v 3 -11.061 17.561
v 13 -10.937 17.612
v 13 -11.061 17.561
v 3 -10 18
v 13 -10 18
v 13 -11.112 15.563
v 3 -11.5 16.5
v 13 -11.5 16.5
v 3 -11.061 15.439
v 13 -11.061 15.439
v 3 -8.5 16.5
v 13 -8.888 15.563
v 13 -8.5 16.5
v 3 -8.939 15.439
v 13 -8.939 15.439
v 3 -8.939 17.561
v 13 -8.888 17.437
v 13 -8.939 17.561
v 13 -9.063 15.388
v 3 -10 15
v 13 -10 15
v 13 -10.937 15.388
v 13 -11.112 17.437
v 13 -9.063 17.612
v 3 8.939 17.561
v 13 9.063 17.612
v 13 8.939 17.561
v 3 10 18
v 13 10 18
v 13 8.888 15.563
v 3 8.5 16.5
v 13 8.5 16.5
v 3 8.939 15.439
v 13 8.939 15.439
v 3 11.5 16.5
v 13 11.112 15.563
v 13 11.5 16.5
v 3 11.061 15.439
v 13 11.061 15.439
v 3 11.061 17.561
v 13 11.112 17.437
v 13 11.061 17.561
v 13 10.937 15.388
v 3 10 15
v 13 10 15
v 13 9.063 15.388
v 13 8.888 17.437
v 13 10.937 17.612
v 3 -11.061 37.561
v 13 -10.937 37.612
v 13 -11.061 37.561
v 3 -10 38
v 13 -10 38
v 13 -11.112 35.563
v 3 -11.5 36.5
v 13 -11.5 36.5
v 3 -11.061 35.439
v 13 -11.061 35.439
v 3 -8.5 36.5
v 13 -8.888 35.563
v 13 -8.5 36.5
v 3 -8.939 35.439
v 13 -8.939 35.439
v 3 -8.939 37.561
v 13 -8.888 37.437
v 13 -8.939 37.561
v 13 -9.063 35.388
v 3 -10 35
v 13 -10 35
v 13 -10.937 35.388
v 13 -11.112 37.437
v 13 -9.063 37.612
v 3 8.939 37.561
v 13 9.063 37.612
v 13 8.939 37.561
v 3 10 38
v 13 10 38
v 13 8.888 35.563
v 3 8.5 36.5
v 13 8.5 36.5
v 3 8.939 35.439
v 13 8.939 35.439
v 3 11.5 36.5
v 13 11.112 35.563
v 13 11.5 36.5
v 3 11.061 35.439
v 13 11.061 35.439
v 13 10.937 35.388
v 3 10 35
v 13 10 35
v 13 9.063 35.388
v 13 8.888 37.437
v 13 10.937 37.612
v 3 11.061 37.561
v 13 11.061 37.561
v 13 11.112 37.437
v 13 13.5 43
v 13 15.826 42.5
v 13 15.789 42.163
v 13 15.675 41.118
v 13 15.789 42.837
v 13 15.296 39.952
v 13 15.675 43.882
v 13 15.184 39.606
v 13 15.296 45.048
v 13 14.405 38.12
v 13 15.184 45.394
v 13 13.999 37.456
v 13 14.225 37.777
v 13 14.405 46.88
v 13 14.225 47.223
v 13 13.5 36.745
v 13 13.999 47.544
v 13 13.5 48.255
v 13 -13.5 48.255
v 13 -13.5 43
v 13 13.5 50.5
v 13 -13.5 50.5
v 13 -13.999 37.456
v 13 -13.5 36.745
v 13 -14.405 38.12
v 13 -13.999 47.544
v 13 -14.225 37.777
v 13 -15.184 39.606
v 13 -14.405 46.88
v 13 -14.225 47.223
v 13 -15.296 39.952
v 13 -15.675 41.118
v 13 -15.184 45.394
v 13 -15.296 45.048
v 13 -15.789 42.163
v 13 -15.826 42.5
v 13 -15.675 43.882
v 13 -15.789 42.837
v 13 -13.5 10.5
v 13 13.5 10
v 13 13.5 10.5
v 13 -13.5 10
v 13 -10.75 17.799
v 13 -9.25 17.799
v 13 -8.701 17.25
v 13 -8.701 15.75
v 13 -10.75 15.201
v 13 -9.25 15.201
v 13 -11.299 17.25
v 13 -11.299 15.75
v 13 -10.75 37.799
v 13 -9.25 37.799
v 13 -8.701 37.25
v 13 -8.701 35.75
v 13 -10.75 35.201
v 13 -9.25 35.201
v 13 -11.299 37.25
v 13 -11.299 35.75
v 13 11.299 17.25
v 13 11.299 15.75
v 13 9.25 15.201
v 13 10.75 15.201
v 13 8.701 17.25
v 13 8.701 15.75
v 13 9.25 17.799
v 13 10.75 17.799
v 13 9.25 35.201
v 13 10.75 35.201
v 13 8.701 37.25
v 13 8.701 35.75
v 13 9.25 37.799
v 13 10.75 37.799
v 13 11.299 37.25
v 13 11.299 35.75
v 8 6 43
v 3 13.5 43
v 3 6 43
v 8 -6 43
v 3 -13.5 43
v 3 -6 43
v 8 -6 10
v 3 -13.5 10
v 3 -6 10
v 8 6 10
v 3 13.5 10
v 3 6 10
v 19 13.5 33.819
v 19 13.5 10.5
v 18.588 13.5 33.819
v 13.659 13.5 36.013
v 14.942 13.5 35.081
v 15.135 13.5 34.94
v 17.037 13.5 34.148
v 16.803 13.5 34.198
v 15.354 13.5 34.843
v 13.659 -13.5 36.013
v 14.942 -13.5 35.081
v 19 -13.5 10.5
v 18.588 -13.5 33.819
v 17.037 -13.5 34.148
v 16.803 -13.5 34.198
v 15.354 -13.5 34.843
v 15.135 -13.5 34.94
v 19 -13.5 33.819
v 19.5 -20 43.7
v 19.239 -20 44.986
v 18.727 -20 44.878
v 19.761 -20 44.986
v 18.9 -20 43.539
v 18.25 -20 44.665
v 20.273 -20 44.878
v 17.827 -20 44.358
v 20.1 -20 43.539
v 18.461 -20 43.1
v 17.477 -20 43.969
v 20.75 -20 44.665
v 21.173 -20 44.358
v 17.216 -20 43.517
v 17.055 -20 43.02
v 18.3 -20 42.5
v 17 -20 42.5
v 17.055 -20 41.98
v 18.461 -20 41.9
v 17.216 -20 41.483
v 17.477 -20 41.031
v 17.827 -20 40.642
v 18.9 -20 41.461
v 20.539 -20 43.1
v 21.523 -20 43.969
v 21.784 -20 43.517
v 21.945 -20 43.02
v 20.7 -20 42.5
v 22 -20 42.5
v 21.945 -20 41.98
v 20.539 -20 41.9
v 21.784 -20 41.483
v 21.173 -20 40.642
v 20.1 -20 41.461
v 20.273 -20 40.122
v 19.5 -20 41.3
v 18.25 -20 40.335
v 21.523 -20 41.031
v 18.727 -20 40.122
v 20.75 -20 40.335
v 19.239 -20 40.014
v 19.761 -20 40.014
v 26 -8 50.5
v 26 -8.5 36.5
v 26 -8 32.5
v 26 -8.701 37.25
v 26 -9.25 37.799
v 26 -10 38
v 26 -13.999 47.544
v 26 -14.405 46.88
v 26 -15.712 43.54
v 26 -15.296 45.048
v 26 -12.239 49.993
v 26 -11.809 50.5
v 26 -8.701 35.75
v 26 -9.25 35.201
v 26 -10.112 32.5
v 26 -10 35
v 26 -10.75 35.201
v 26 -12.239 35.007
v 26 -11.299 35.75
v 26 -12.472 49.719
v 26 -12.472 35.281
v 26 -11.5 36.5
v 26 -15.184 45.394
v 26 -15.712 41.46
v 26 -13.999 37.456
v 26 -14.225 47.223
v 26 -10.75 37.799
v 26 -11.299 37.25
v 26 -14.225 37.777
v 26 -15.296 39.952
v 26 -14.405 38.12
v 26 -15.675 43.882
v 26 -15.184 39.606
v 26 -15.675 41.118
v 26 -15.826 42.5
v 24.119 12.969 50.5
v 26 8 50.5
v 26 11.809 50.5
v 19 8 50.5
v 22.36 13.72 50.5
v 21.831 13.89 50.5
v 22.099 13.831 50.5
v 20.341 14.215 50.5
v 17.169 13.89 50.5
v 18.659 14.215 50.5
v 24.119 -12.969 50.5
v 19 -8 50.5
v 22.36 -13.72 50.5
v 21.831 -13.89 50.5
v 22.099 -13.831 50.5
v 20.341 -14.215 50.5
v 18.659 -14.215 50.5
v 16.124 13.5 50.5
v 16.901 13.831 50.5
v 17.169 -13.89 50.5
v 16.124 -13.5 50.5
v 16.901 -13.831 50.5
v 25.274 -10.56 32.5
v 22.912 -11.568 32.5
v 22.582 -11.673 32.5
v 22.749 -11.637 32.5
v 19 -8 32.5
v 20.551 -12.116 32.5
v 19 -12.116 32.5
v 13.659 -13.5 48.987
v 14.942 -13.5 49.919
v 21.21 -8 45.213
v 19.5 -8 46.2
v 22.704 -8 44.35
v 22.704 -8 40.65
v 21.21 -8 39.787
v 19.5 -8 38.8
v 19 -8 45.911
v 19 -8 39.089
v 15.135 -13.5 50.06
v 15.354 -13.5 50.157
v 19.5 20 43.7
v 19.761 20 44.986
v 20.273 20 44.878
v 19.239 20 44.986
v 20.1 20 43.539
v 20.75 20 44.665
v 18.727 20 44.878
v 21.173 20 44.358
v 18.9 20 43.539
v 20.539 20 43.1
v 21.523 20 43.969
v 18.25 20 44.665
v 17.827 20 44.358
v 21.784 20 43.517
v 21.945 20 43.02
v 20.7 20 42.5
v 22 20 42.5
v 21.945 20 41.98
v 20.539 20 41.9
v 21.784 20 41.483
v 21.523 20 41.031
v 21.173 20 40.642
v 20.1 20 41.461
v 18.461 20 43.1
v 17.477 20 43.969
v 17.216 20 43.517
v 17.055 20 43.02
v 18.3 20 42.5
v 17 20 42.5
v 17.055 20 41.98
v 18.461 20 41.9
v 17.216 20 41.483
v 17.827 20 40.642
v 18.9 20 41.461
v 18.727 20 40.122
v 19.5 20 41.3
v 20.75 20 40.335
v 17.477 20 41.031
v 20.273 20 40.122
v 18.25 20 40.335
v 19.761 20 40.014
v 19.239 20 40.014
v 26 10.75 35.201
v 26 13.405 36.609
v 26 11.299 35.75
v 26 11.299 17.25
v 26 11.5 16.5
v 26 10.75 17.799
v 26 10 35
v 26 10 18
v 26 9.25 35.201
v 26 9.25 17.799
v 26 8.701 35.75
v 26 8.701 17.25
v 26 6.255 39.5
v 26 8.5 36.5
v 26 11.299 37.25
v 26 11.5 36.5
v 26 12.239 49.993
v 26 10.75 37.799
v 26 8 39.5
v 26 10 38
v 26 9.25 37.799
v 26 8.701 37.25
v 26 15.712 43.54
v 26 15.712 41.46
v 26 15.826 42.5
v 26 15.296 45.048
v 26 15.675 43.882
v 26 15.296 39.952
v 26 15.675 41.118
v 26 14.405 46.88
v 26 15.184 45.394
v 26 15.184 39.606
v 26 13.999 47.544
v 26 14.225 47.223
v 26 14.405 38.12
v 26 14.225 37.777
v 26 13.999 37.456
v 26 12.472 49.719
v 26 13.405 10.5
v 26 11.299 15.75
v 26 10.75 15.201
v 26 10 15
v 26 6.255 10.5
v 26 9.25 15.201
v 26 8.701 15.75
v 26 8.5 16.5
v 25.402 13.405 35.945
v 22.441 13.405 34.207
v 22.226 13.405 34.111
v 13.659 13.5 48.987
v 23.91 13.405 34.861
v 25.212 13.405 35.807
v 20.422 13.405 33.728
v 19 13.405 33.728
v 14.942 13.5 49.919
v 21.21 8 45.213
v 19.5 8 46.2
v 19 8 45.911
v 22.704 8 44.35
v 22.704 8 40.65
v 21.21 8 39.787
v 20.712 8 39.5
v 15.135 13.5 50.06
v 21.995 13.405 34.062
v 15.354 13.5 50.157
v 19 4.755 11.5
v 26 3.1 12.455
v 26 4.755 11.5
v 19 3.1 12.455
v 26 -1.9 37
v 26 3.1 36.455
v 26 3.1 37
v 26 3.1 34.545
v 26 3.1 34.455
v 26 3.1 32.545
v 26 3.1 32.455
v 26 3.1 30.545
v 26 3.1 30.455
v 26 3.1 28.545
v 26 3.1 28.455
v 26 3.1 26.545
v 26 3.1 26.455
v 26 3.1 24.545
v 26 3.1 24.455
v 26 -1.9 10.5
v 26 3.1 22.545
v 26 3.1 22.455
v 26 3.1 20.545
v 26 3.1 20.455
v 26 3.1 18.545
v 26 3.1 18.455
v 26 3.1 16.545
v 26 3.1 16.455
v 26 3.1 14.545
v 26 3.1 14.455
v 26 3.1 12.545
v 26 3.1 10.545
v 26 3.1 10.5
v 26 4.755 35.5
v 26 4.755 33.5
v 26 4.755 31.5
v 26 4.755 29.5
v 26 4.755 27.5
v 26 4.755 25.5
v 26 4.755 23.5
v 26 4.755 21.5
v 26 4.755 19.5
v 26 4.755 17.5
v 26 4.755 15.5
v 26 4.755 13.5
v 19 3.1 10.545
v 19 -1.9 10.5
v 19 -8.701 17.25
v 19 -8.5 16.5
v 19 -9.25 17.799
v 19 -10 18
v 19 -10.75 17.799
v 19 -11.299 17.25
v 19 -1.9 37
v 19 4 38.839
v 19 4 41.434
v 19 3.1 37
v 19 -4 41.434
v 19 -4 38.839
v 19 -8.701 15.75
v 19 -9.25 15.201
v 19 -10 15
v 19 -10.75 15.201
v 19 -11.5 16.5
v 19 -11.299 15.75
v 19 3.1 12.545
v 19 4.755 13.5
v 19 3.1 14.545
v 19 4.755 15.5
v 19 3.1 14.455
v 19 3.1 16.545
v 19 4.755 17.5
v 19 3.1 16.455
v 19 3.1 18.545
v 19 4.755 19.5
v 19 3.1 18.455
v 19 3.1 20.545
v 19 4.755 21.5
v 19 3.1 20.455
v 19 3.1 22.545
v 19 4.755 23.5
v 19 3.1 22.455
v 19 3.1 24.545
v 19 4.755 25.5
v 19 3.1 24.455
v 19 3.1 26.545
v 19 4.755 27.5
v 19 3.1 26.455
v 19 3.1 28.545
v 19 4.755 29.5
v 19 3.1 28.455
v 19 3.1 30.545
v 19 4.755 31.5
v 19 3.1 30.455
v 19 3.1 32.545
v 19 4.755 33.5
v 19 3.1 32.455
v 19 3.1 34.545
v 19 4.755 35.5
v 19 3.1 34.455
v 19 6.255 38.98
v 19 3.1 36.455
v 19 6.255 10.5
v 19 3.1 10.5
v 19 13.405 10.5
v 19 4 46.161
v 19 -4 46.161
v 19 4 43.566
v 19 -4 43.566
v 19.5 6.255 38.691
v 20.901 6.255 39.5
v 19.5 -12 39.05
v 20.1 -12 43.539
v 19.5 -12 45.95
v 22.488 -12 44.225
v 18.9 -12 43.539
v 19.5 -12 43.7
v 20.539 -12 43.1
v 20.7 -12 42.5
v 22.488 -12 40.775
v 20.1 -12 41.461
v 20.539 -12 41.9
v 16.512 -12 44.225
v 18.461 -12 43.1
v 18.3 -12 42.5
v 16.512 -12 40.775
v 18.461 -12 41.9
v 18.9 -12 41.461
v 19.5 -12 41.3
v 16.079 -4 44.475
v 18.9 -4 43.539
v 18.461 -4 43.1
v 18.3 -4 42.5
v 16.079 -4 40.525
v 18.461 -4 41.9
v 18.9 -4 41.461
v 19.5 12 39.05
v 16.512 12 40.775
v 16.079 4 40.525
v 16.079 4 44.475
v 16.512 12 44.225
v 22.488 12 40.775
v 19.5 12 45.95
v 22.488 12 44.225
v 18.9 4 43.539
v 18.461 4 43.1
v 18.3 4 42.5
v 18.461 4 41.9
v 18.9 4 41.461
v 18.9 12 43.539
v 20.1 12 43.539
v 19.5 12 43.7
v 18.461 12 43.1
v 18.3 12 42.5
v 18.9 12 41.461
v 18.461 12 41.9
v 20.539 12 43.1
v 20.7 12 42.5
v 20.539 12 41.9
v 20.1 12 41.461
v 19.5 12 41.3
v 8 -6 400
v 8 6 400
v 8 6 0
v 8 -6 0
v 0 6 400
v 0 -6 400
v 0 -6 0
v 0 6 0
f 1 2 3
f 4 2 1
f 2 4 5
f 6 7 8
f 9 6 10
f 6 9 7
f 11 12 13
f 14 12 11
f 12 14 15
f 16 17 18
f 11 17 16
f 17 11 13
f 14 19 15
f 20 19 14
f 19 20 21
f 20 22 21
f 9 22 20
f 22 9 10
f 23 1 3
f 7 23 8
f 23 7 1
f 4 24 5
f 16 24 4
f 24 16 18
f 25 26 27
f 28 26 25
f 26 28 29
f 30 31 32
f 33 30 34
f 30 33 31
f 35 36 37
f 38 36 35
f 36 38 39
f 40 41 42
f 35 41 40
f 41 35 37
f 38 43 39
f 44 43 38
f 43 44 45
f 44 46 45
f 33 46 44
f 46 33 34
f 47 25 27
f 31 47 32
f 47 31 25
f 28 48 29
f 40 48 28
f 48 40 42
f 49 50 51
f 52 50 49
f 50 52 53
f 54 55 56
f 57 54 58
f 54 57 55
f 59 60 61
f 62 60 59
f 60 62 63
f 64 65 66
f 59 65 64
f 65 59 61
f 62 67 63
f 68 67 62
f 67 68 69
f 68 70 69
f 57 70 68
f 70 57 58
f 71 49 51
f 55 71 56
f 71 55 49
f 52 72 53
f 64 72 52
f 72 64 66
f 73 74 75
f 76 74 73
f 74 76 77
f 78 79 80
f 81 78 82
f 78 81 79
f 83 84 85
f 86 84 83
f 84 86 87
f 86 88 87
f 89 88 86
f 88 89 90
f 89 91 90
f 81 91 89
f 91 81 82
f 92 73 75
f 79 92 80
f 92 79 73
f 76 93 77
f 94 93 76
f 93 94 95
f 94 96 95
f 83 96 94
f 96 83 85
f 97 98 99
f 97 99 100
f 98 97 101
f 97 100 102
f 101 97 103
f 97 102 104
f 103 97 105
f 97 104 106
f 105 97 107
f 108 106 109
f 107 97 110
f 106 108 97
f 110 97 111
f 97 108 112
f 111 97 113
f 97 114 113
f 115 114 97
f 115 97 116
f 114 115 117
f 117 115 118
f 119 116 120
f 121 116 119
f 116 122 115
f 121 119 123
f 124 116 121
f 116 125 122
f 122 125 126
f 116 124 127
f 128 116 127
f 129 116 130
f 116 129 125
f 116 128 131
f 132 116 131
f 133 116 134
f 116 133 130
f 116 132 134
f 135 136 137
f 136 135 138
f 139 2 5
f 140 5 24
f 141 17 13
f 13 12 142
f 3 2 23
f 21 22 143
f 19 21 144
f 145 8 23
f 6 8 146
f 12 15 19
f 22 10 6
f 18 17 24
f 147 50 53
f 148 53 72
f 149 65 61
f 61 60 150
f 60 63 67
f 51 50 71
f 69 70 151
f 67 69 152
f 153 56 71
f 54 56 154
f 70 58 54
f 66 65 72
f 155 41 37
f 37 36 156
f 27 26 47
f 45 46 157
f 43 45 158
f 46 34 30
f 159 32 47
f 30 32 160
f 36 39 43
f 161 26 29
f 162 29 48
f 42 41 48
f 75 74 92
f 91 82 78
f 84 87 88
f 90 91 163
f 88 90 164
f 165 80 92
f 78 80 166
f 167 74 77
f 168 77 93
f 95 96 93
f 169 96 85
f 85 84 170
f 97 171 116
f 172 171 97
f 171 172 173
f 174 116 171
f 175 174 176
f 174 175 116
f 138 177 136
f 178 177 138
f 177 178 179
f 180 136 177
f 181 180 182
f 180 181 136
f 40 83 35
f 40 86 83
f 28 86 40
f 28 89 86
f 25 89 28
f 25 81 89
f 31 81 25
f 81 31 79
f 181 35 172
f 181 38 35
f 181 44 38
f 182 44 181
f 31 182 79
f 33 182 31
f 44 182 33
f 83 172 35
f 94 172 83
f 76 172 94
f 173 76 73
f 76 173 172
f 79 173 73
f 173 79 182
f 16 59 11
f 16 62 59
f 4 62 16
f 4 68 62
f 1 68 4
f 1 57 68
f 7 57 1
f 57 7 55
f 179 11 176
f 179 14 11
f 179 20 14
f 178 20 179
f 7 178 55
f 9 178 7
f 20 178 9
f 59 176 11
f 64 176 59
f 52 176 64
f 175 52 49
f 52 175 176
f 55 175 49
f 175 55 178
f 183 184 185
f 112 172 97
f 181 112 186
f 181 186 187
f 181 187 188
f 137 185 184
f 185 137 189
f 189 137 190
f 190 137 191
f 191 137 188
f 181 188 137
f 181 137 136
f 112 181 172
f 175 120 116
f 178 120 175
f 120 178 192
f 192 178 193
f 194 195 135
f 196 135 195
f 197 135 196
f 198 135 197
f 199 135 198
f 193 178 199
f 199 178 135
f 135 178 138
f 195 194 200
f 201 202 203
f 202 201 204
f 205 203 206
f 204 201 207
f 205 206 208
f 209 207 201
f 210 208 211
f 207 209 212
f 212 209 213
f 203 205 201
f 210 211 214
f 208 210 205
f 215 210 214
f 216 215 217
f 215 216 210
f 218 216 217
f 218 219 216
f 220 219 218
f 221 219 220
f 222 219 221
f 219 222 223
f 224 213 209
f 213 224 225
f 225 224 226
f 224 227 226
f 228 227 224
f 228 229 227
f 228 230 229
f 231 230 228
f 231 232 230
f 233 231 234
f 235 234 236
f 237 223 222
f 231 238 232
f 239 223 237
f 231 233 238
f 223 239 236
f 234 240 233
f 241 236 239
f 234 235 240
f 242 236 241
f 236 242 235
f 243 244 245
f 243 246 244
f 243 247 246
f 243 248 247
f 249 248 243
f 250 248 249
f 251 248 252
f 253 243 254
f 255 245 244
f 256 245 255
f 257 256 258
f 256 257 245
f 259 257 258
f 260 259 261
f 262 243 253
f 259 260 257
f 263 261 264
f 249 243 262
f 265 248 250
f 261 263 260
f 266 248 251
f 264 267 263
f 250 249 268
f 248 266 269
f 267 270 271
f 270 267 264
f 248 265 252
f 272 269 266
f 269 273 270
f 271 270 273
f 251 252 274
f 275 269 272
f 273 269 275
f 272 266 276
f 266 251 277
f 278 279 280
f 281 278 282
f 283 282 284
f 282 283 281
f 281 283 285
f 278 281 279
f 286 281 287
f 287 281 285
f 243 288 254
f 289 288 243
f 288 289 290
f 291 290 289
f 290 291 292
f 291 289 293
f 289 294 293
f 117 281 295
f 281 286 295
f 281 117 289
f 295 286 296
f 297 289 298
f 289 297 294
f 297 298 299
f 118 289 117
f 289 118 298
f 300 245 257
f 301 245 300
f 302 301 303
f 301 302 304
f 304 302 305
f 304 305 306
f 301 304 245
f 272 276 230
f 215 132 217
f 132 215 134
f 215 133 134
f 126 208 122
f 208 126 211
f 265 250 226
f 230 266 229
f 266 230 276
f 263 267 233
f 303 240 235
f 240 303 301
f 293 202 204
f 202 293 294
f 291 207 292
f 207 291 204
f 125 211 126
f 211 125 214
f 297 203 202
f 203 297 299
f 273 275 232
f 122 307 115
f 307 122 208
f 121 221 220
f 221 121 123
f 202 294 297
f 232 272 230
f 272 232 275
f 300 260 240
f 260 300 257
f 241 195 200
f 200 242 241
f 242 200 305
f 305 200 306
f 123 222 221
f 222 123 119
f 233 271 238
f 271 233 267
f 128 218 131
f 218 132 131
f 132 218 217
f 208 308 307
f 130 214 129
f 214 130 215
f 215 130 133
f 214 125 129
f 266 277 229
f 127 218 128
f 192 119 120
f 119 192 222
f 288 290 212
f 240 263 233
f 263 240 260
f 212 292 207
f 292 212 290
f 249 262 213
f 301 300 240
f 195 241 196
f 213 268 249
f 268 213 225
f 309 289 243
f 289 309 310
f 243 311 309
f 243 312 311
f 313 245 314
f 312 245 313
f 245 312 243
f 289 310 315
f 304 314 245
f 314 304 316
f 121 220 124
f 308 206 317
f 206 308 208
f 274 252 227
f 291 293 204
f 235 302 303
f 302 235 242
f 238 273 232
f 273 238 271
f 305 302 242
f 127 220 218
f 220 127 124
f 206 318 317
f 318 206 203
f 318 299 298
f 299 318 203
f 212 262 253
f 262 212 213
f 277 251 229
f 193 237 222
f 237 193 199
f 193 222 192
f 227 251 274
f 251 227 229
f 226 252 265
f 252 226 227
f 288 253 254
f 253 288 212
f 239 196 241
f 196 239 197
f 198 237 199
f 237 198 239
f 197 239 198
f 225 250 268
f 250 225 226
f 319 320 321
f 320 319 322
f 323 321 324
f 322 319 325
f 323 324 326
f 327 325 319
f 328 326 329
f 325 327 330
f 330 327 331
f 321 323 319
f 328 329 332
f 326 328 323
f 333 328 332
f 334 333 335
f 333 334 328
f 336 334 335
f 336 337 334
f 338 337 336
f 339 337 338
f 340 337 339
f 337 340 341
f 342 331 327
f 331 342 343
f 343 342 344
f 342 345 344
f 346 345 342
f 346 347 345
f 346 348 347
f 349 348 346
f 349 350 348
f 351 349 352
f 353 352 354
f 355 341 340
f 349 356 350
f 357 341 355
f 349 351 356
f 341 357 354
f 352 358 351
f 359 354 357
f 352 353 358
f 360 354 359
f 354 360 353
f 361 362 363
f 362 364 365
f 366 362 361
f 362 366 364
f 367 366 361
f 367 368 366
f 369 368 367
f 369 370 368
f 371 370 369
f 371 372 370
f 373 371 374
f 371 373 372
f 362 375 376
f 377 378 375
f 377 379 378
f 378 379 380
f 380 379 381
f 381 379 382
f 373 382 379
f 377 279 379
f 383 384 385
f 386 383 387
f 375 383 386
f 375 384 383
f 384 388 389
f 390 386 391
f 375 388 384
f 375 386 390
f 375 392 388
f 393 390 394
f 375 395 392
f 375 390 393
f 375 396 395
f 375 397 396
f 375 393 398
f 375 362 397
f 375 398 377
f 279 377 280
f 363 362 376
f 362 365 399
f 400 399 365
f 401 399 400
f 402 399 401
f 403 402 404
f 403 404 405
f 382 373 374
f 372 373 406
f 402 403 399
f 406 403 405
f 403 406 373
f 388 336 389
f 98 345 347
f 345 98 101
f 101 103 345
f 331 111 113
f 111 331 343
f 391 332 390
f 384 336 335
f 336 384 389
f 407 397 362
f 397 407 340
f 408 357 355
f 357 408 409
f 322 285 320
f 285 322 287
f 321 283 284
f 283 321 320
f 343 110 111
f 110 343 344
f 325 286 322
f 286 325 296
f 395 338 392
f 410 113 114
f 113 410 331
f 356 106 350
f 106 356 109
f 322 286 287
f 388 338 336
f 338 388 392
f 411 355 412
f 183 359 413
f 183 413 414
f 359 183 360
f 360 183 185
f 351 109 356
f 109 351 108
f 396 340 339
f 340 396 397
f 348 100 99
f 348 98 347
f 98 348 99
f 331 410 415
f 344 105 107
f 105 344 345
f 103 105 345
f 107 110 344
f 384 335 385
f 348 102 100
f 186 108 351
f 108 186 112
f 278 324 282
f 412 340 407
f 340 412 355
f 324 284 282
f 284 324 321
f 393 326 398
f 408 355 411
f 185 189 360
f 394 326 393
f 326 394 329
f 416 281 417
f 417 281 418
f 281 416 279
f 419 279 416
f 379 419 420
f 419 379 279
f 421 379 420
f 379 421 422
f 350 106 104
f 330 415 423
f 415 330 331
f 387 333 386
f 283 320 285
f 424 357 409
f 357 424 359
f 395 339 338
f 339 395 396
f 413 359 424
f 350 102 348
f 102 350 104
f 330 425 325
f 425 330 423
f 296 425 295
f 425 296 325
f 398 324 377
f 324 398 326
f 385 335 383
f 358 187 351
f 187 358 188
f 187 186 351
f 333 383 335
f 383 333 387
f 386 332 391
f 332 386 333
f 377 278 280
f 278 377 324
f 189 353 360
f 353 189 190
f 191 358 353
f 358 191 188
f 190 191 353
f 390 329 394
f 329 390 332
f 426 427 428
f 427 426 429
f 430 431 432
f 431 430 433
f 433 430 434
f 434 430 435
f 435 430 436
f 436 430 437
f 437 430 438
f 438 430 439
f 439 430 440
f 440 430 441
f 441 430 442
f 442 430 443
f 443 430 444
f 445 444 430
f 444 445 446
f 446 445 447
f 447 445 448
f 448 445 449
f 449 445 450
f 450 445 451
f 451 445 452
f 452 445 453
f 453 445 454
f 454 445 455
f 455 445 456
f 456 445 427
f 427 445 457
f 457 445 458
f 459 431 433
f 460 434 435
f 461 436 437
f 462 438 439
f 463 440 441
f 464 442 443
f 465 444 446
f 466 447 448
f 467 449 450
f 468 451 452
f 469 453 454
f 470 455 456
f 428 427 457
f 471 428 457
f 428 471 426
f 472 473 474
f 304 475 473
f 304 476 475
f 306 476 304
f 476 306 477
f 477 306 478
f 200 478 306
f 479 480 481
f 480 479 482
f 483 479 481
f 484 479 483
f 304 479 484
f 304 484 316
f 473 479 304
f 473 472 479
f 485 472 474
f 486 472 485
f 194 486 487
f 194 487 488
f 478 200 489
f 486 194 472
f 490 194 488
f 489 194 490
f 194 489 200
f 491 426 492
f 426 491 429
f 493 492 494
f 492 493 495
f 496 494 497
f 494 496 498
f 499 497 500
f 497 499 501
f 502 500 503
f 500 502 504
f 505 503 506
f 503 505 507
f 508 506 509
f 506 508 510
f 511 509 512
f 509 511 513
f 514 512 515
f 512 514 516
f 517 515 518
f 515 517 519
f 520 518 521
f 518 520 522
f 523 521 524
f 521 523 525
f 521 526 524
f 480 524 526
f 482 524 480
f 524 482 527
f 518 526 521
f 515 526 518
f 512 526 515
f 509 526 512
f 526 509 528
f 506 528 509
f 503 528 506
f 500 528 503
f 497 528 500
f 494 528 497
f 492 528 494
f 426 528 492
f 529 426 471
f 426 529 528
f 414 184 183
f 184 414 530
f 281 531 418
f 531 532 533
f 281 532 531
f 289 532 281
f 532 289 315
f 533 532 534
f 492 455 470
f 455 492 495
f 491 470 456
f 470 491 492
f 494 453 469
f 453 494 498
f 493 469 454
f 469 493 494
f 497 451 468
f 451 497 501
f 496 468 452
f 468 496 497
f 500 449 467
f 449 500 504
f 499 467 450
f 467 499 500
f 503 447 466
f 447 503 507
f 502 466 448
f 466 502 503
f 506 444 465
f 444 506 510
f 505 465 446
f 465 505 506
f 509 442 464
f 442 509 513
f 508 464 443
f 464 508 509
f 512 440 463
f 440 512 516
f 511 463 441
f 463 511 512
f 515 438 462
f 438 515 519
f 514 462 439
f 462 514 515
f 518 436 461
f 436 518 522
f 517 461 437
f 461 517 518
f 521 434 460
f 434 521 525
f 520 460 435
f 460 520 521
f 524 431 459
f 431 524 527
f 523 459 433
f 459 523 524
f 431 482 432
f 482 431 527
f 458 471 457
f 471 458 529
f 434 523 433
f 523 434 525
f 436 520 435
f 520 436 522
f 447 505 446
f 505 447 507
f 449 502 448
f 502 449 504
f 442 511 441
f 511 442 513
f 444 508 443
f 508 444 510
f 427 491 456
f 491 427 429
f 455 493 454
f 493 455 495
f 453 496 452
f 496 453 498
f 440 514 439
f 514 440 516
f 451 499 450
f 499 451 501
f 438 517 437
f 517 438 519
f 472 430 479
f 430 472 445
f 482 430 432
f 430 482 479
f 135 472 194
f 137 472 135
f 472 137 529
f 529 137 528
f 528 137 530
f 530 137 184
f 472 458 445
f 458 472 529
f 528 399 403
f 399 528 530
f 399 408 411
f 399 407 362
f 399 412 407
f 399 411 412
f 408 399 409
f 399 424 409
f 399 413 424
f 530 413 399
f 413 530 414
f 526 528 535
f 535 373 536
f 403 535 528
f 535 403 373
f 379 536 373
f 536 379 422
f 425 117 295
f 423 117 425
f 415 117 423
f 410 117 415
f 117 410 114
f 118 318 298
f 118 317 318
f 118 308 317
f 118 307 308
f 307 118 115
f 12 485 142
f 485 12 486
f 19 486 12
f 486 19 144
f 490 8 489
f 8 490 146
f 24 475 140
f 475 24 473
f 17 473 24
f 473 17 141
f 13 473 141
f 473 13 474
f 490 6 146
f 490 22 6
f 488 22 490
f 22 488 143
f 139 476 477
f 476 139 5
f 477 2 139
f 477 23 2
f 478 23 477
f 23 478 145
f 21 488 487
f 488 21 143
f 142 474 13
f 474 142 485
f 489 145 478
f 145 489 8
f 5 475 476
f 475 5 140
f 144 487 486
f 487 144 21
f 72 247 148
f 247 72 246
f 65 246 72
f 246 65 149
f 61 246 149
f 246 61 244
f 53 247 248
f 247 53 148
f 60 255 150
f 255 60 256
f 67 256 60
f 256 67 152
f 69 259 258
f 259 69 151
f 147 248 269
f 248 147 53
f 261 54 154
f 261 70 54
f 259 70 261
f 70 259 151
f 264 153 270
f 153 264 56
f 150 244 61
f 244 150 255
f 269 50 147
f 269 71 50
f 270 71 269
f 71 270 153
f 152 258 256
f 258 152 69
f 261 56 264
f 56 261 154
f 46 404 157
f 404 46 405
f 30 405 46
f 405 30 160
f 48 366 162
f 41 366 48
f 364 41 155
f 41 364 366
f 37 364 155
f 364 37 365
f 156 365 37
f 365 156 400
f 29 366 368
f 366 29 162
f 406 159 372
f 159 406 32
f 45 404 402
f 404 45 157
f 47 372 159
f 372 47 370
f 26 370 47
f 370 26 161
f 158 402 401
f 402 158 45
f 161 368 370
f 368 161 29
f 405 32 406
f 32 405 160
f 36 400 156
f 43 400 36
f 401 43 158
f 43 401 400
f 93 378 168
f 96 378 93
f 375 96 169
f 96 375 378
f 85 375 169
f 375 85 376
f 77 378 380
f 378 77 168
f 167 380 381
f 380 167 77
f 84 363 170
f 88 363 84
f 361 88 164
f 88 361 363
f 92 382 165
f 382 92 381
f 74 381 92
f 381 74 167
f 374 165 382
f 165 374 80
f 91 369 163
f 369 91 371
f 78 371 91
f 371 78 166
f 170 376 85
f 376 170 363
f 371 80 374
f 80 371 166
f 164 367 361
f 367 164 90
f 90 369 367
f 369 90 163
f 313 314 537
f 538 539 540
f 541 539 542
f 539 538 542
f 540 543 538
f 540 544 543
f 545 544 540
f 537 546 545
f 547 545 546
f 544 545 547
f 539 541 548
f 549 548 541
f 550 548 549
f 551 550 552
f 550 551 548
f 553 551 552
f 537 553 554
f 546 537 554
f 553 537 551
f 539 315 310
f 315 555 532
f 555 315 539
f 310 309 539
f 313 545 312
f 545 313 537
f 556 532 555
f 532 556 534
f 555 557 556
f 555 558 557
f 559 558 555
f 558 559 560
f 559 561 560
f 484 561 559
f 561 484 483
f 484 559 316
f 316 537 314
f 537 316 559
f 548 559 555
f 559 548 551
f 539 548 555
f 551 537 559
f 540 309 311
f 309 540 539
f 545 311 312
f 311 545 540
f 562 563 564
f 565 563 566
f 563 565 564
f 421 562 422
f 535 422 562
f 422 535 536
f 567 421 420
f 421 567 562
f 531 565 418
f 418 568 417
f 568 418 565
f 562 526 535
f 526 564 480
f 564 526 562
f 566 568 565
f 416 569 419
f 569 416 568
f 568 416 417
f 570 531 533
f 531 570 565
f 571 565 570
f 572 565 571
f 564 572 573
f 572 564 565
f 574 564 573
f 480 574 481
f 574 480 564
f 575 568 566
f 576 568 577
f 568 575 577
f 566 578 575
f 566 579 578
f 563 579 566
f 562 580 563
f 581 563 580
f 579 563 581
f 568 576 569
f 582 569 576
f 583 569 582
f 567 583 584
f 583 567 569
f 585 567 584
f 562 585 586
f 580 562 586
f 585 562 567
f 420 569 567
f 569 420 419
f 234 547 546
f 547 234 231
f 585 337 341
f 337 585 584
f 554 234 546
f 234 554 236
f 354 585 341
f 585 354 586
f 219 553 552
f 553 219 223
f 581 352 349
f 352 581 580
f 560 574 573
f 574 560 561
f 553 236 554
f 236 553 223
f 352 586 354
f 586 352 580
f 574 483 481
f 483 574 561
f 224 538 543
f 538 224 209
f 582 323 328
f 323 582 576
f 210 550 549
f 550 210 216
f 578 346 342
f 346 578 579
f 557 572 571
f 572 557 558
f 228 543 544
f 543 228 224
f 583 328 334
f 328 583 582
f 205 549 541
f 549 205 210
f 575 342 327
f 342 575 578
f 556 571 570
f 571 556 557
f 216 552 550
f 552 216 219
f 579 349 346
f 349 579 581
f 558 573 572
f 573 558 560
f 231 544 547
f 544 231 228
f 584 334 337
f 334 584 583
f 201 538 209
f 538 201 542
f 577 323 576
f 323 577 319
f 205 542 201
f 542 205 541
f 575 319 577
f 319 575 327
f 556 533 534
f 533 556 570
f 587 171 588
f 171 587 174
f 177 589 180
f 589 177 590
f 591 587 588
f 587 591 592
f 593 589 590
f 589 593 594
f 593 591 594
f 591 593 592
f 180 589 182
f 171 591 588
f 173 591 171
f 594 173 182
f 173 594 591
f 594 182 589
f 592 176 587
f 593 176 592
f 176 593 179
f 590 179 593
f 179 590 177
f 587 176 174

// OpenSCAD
// file: configuration.scad
// Increase this if your slicer or printer make holes too tight.
extra_radius = 0.20;

// OD = outside diameter, corner to corner.
m3_nut_od = 6.1;
m3_nut_radius = m3_nut_od/2 + 0.2 + extra_radius;

// Major diameter of metric 3mm thread.
m3_major = 2.85;
m3_radius = m3_major/2 + extra_radius;
m3_wide_radius = m3_major/2 + extra_radius + 0.2;

// NEMA17 stepper motors.
motor_shaft_diameter = 5;
motor_shaft_radius = motor_shaft_diameter/2 + extra_radius;

// Frame brackets. M3x8mm screws work best with 3.6 mm brackets.
thickness = 3.6;

// OpenBeam or Misumi. Currently only 15x15 mm, but there is a plan
// to make models more parametric and allow 20x20 mm in the future.
//extrusion = 15;
extrusion = 20;
//extrusion_block_width = 2.5; //15x15
extrusion_block_width = 6.1; //20x20

//corner_radius = 36; //15x15
corner_radius = 40; //20x20

//extrusion_offset = 0;//15x15
extrusion_offset = -2.5; //20x20

//height_offset = 0; //15x15
height_offset = -extrusion_offset; //20x20

//screw_offset=-7.5; //15x15
screw_offset=-12; //20x20
// file: carriage.scad
include <configuration.scad>;

separation = 40;
thickness = 6;

horn_thickness = 13;
horn_x = 8;

belt_width = 5;
belt_x = 5.6;
belt_z = 7;
belt_gas = 1/cos(30)+0.7+0.2+extra_radius;

module carriage() {
  // Timing belt (up and down).
  translate([-belt_x, 0, belt_z + belt_width/2]) %
    cube([1.7, 100, belt_width], center=true);
  translate([belt_x, 0, belt_z + belt_width/2]) %
    cube([1.7, 100, belt_width], center=true);
  difference() {
    union() {
      // Main body.
      translate([0, 4, thickness/2])
        cube([27, 40, thickness], center=true);
      // Ball joint mount horns.
      for (x = [-1, 1]) {
        scale([x, 1, 1]) intersection() {
          translate([0, 15, horn_thickness/2])
            cube([separation, 18, horn_thickness], center=true);
          translate([horn_x, 16, horn_thickness/2]) rotate([0, 90, 0])
            cylinder(r1=14, r2=2.5, h=separation/2-horn_x);
        }
      }//for
      // Belt clamps.
      difference() {
        union() {
      //   translate([6.5, -2.5, horn_thickness/2+1])
      //      cube([14, 7, horn_thickness-2], center=true);
      //   translate([10.75, 2.5, horn_thickness/2+1])
      //      cube([5.5, 16, horn_thickness-2], center=true);
        }
        // Avoid touching diagonal push rods (carbon tube).
      //  translate([20, -10, 12.5]) rotate([35, 35, 30])
      //    cube([40, 40, 20], center=true);
      }
//卡带槽
	union()
	{
		translate([5-1-0.4, -15, thickness])gt2(w=7,l=25);
//		translate([5-1, -15+16, thickness])gt2(w=7,l=10);
		translate([-2-1+0.9+0.2,-16,thickness])cube([5,26.5,7]);
//		translate([-2.5-1,-16+16,thickness])cube([7,12,7]);
//		translate([5-3, -15+11.5, thickness])rotate([0,0,90])gt2(w=7,l=5);
//		translate([-2, -15+14.5, thickness])rotate([0,0,-90])gt2(w=7,l=5);
		translate([5-1+belt_gas,-16,thickness])cube([7+0.15,26+3,7]);
	}
 /*     for (y = [-12, 7]) {
    #    translate([1.25, y, thickness+4])
          cube([7, 8, 8], center=true);
      } */
    }//union
    // Screws for linear slider.
    for (x = [-10, 10]) {
      for (y = [-10, 10]) {
        translate([x, y, thickness]) 
          cylinder(r=1.5, h=30, center=true, $fn=12);
      }
    }
    // Screws for ball joints.
    translate([0, 16, horn_thickness/2]) rotate([0, 90, 0]) 
      cylinder(r=1.2, h=60, center=true, $fn=12);
    // Lock nuts for ball joints.
    for (x = [-1, 1]) {
      scale([x, 1, 1]) intersection() {
        translate([horn_x, 16, horn_thickness/2]) rotate([90, 0, -90])
          cylinder(r1=m3_nut_radius, r2=m3_nut_radius+0.5, h=8,
                   center=true, $fn=6);
      }
    }
  }
}
//GT2齿面
module gt2(l,w)
{
	//cube([1,l,w]);
	for(n=[0:2:l])
	{
		translate([0,n,0])cylinder(r=1/cos(30),h=w,$fn=3);
	}
}

module test_gt2(s)
{
	union()
	{
		gt2(w=6,l=20);
		translate([-4.5,0,-3])cube([11,20,3]);
		translate([1/cos(30)+s+0.2+extra_radius,0,0])cube([4,20,6]);
		translate([-4.5,0,0])cube([4,20,6]);
	}
}

//translate([0,0,10])test_gt2(s=0.7);
carriage();
// main file
use <carriage.scad>

module rod(z=0)
{
	translate([0,-6,0])
	{
		cube([8,12,400]);
		block(z);
	}
}

module block(z)
{
	translate([3,-((27-12)/2),z])
	{
		difference()
		{
			cube([10,27,33]);
	
			for(s=[-1,1],m=[-1,1])
			{
				#translate([-1,27/2+(27/2-3.5)*m,33/2+(33/2-6.5)*s])rotate([0,90,0])cylinder(r=1.5,h=120,$fn=8);
			}
		}
		translate([10,27/2,33/2])rotate([0,0,90])rotate([90,0,0])carriage();
	}
}

rod(10);
